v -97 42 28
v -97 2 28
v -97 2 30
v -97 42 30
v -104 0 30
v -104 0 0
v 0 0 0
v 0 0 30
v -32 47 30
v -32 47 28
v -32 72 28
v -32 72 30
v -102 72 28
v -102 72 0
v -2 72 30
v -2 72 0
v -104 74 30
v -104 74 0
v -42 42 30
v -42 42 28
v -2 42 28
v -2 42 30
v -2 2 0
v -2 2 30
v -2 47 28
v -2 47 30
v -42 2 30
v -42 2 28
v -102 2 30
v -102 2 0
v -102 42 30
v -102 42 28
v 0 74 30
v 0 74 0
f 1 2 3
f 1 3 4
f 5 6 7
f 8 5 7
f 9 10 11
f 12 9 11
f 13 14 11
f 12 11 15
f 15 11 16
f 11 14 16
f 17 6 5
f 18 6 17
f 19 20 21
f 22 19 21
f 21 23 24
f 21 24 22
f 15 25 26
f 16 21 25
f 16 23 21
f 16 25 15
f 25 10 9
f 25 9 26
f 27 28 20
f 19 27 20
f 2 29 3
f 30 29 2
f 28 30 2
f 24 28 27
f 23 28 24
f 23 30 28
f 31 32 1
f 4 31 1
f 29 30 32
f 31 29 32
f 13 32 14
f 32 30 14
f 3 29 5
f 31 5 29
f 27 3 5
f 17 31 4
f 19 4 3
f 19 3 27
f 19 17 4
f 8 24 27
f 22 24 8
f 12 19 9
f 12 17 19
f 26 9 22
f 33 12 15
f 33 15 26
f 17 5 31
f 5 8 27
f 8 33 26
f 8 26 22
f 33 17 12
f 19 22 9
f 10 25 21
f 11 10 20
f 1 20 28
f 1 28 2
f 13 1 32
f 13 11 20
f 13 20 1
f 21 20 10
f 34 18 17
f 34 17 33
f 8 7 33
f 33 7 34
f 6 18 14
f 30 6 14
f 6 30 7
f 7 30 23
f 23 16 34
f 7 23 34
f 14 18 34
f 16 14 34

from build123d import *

# Parameters (mm, degrees)
SKETCH1_W           = 104
SKETCH1_H           = 74
SKETCH1_W_2         = 5
SKETCH1_H_2         = 40
SKETCH1_W_3         = 40
SKETCH1_W_4         = 30
SKETCH1_H_3         = 25
BOSS_EXTRUDE1_DEPTH = 30
SKETCH2_W           = 100
SKETCH2_H           = 70
CUT_EXTRUDE1_DEPTH  = 28


with BuildPart() as part:
    # Sketch1 → Boss-Extrude1 (new body)
    with BuildSketch(Plane.XY):
        with Locations((-52, 37)):
            Rectangle(SKETCH1_W, SKETCH1_H)
        with Locations((-99.5, 22)):
            Rectangle(SKETCH1_W_2, SKETCH1_H_2, mode=Mode.SUBTRACT)
        with Locations((-22, 22)):
            Rectangle(SKETCH1_W_3, SKETCH1_H_2, mode=Mode.SUBTRACT)
        with Locations((-17, 59.5)):
            Rectangle(SKETCH1_W_4, SKETCH1_H_3, mode=Mode.SUBTRACT)
    extrude(amount=BOSS_EXTRUDE1_DEPTH)

    # Sketch2 → Cut-Extrude1 (cut)
    with BuildSketch(Plane(origin=(0, 0, 0), x_dir=(-1, 0, 0), z_dir=(0, 0, -1))):
        with Locations((52, 37)):
            Rectangle(SKETCH2_W, SKETCH2_H)
    extrude(amount=-CUT_EXTRUDE1_DEPTH, mode=Mode.SUBTRACT)


solid = part.part
